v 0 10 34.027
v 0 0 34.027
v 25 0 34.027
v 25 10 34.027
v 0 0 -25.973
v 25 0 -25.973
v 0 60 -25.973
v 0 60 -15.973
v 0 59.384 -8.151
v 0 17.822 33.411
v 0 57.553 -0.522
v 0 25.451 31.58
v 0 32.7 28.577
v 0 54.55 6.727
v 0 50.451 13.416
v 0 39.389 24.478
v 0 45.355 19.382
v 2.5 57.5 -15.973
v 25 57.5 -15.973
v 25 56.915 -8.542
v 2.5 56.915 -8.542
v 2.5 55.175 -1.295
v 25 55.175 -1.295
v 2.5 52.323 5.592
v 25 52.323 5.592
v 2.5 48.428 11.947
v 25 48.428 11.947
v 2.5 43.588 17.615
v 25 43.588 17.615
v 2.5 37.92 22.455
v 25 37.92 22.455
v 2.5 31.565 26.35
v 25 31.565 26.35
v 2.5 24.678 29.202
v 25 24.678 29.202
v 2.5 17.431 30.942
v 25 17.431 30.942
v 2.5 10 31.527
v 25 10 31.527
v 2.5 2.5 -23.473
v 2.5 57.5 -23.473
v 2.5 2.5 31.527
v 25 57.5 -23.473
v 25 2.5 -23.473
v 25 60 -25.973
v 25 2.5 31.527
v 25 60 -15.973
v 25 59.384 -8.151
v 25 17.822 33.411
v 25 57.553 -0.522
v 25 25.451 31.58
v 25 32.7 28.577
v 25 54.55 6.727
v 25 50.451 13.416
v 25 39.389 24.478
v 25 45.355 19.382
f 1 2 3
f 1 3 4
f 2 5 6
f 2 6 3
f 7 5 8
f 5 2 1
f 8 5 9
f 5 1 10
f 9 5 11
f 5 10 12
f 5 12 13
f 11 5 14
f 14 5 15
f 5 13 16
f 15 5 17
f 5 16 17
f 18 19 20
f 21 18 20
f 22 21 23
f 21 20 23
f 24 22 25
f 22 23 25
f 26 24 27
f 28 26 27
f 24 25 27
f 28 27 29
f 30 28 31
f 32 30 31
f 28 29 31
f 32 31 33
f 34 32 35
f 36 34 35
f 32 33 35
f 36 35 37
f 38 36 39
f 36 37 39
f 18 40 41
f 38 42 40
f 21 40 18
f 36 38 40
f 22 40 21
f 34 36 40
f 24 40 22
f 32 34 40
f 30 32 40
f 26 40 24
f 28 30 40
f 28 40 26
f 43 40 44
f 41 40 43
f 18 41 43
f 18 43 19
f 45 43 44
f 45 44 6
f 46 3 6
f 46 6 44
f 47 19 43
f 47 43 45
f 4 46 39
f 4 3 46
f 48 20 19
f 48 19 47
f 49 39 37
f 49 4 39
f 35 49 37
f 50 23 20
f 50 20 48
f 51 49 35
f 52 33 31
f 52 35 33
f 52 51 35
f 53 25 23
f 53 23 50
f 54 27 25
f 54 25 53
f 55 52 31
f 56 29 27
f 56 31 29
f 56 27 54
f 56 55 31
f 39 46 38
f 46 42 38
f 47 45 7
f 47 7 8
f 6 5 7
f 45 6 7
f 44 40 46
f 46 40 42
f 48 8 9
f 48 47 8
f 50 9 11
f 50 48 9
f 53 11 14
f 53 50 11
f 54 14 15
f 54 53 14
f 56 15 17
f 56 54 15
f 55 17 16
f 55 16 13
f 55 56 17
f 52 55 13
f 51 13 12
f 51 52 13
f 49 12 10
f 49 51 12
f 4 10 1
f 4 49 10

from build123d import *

# Parameters (mm, degrees)
F0_W     = 60
F0_H     = 60
F1_DEPTH = 25
F2_R     = 50
F3_T     = -2.5


with BuildPart() as f1:
    # F0 (on Right) → F1 (new body)
    with BuildSketch(Plane.YZ):
        with Locations((30, 4.027068)):
            Rectangle(F0_W, F0_H)
    extrude(amount=F1_DEPTH)

    # F2
    f2_edges = [f1.edges().sort_by_distance(p)[0] for p in [
        (12.5, 60, 34.027068),
    ]]
    fillet(f2_edges, radius=F2_R)

    # F3
    f3_openings = [f1.faces().sort_by_distance(p)[0] for p in [
        (25, 26.702054, 0.729122),
    ]]
    offset(amount=F3_T, openings=f3_openings)


solid = f1.part
